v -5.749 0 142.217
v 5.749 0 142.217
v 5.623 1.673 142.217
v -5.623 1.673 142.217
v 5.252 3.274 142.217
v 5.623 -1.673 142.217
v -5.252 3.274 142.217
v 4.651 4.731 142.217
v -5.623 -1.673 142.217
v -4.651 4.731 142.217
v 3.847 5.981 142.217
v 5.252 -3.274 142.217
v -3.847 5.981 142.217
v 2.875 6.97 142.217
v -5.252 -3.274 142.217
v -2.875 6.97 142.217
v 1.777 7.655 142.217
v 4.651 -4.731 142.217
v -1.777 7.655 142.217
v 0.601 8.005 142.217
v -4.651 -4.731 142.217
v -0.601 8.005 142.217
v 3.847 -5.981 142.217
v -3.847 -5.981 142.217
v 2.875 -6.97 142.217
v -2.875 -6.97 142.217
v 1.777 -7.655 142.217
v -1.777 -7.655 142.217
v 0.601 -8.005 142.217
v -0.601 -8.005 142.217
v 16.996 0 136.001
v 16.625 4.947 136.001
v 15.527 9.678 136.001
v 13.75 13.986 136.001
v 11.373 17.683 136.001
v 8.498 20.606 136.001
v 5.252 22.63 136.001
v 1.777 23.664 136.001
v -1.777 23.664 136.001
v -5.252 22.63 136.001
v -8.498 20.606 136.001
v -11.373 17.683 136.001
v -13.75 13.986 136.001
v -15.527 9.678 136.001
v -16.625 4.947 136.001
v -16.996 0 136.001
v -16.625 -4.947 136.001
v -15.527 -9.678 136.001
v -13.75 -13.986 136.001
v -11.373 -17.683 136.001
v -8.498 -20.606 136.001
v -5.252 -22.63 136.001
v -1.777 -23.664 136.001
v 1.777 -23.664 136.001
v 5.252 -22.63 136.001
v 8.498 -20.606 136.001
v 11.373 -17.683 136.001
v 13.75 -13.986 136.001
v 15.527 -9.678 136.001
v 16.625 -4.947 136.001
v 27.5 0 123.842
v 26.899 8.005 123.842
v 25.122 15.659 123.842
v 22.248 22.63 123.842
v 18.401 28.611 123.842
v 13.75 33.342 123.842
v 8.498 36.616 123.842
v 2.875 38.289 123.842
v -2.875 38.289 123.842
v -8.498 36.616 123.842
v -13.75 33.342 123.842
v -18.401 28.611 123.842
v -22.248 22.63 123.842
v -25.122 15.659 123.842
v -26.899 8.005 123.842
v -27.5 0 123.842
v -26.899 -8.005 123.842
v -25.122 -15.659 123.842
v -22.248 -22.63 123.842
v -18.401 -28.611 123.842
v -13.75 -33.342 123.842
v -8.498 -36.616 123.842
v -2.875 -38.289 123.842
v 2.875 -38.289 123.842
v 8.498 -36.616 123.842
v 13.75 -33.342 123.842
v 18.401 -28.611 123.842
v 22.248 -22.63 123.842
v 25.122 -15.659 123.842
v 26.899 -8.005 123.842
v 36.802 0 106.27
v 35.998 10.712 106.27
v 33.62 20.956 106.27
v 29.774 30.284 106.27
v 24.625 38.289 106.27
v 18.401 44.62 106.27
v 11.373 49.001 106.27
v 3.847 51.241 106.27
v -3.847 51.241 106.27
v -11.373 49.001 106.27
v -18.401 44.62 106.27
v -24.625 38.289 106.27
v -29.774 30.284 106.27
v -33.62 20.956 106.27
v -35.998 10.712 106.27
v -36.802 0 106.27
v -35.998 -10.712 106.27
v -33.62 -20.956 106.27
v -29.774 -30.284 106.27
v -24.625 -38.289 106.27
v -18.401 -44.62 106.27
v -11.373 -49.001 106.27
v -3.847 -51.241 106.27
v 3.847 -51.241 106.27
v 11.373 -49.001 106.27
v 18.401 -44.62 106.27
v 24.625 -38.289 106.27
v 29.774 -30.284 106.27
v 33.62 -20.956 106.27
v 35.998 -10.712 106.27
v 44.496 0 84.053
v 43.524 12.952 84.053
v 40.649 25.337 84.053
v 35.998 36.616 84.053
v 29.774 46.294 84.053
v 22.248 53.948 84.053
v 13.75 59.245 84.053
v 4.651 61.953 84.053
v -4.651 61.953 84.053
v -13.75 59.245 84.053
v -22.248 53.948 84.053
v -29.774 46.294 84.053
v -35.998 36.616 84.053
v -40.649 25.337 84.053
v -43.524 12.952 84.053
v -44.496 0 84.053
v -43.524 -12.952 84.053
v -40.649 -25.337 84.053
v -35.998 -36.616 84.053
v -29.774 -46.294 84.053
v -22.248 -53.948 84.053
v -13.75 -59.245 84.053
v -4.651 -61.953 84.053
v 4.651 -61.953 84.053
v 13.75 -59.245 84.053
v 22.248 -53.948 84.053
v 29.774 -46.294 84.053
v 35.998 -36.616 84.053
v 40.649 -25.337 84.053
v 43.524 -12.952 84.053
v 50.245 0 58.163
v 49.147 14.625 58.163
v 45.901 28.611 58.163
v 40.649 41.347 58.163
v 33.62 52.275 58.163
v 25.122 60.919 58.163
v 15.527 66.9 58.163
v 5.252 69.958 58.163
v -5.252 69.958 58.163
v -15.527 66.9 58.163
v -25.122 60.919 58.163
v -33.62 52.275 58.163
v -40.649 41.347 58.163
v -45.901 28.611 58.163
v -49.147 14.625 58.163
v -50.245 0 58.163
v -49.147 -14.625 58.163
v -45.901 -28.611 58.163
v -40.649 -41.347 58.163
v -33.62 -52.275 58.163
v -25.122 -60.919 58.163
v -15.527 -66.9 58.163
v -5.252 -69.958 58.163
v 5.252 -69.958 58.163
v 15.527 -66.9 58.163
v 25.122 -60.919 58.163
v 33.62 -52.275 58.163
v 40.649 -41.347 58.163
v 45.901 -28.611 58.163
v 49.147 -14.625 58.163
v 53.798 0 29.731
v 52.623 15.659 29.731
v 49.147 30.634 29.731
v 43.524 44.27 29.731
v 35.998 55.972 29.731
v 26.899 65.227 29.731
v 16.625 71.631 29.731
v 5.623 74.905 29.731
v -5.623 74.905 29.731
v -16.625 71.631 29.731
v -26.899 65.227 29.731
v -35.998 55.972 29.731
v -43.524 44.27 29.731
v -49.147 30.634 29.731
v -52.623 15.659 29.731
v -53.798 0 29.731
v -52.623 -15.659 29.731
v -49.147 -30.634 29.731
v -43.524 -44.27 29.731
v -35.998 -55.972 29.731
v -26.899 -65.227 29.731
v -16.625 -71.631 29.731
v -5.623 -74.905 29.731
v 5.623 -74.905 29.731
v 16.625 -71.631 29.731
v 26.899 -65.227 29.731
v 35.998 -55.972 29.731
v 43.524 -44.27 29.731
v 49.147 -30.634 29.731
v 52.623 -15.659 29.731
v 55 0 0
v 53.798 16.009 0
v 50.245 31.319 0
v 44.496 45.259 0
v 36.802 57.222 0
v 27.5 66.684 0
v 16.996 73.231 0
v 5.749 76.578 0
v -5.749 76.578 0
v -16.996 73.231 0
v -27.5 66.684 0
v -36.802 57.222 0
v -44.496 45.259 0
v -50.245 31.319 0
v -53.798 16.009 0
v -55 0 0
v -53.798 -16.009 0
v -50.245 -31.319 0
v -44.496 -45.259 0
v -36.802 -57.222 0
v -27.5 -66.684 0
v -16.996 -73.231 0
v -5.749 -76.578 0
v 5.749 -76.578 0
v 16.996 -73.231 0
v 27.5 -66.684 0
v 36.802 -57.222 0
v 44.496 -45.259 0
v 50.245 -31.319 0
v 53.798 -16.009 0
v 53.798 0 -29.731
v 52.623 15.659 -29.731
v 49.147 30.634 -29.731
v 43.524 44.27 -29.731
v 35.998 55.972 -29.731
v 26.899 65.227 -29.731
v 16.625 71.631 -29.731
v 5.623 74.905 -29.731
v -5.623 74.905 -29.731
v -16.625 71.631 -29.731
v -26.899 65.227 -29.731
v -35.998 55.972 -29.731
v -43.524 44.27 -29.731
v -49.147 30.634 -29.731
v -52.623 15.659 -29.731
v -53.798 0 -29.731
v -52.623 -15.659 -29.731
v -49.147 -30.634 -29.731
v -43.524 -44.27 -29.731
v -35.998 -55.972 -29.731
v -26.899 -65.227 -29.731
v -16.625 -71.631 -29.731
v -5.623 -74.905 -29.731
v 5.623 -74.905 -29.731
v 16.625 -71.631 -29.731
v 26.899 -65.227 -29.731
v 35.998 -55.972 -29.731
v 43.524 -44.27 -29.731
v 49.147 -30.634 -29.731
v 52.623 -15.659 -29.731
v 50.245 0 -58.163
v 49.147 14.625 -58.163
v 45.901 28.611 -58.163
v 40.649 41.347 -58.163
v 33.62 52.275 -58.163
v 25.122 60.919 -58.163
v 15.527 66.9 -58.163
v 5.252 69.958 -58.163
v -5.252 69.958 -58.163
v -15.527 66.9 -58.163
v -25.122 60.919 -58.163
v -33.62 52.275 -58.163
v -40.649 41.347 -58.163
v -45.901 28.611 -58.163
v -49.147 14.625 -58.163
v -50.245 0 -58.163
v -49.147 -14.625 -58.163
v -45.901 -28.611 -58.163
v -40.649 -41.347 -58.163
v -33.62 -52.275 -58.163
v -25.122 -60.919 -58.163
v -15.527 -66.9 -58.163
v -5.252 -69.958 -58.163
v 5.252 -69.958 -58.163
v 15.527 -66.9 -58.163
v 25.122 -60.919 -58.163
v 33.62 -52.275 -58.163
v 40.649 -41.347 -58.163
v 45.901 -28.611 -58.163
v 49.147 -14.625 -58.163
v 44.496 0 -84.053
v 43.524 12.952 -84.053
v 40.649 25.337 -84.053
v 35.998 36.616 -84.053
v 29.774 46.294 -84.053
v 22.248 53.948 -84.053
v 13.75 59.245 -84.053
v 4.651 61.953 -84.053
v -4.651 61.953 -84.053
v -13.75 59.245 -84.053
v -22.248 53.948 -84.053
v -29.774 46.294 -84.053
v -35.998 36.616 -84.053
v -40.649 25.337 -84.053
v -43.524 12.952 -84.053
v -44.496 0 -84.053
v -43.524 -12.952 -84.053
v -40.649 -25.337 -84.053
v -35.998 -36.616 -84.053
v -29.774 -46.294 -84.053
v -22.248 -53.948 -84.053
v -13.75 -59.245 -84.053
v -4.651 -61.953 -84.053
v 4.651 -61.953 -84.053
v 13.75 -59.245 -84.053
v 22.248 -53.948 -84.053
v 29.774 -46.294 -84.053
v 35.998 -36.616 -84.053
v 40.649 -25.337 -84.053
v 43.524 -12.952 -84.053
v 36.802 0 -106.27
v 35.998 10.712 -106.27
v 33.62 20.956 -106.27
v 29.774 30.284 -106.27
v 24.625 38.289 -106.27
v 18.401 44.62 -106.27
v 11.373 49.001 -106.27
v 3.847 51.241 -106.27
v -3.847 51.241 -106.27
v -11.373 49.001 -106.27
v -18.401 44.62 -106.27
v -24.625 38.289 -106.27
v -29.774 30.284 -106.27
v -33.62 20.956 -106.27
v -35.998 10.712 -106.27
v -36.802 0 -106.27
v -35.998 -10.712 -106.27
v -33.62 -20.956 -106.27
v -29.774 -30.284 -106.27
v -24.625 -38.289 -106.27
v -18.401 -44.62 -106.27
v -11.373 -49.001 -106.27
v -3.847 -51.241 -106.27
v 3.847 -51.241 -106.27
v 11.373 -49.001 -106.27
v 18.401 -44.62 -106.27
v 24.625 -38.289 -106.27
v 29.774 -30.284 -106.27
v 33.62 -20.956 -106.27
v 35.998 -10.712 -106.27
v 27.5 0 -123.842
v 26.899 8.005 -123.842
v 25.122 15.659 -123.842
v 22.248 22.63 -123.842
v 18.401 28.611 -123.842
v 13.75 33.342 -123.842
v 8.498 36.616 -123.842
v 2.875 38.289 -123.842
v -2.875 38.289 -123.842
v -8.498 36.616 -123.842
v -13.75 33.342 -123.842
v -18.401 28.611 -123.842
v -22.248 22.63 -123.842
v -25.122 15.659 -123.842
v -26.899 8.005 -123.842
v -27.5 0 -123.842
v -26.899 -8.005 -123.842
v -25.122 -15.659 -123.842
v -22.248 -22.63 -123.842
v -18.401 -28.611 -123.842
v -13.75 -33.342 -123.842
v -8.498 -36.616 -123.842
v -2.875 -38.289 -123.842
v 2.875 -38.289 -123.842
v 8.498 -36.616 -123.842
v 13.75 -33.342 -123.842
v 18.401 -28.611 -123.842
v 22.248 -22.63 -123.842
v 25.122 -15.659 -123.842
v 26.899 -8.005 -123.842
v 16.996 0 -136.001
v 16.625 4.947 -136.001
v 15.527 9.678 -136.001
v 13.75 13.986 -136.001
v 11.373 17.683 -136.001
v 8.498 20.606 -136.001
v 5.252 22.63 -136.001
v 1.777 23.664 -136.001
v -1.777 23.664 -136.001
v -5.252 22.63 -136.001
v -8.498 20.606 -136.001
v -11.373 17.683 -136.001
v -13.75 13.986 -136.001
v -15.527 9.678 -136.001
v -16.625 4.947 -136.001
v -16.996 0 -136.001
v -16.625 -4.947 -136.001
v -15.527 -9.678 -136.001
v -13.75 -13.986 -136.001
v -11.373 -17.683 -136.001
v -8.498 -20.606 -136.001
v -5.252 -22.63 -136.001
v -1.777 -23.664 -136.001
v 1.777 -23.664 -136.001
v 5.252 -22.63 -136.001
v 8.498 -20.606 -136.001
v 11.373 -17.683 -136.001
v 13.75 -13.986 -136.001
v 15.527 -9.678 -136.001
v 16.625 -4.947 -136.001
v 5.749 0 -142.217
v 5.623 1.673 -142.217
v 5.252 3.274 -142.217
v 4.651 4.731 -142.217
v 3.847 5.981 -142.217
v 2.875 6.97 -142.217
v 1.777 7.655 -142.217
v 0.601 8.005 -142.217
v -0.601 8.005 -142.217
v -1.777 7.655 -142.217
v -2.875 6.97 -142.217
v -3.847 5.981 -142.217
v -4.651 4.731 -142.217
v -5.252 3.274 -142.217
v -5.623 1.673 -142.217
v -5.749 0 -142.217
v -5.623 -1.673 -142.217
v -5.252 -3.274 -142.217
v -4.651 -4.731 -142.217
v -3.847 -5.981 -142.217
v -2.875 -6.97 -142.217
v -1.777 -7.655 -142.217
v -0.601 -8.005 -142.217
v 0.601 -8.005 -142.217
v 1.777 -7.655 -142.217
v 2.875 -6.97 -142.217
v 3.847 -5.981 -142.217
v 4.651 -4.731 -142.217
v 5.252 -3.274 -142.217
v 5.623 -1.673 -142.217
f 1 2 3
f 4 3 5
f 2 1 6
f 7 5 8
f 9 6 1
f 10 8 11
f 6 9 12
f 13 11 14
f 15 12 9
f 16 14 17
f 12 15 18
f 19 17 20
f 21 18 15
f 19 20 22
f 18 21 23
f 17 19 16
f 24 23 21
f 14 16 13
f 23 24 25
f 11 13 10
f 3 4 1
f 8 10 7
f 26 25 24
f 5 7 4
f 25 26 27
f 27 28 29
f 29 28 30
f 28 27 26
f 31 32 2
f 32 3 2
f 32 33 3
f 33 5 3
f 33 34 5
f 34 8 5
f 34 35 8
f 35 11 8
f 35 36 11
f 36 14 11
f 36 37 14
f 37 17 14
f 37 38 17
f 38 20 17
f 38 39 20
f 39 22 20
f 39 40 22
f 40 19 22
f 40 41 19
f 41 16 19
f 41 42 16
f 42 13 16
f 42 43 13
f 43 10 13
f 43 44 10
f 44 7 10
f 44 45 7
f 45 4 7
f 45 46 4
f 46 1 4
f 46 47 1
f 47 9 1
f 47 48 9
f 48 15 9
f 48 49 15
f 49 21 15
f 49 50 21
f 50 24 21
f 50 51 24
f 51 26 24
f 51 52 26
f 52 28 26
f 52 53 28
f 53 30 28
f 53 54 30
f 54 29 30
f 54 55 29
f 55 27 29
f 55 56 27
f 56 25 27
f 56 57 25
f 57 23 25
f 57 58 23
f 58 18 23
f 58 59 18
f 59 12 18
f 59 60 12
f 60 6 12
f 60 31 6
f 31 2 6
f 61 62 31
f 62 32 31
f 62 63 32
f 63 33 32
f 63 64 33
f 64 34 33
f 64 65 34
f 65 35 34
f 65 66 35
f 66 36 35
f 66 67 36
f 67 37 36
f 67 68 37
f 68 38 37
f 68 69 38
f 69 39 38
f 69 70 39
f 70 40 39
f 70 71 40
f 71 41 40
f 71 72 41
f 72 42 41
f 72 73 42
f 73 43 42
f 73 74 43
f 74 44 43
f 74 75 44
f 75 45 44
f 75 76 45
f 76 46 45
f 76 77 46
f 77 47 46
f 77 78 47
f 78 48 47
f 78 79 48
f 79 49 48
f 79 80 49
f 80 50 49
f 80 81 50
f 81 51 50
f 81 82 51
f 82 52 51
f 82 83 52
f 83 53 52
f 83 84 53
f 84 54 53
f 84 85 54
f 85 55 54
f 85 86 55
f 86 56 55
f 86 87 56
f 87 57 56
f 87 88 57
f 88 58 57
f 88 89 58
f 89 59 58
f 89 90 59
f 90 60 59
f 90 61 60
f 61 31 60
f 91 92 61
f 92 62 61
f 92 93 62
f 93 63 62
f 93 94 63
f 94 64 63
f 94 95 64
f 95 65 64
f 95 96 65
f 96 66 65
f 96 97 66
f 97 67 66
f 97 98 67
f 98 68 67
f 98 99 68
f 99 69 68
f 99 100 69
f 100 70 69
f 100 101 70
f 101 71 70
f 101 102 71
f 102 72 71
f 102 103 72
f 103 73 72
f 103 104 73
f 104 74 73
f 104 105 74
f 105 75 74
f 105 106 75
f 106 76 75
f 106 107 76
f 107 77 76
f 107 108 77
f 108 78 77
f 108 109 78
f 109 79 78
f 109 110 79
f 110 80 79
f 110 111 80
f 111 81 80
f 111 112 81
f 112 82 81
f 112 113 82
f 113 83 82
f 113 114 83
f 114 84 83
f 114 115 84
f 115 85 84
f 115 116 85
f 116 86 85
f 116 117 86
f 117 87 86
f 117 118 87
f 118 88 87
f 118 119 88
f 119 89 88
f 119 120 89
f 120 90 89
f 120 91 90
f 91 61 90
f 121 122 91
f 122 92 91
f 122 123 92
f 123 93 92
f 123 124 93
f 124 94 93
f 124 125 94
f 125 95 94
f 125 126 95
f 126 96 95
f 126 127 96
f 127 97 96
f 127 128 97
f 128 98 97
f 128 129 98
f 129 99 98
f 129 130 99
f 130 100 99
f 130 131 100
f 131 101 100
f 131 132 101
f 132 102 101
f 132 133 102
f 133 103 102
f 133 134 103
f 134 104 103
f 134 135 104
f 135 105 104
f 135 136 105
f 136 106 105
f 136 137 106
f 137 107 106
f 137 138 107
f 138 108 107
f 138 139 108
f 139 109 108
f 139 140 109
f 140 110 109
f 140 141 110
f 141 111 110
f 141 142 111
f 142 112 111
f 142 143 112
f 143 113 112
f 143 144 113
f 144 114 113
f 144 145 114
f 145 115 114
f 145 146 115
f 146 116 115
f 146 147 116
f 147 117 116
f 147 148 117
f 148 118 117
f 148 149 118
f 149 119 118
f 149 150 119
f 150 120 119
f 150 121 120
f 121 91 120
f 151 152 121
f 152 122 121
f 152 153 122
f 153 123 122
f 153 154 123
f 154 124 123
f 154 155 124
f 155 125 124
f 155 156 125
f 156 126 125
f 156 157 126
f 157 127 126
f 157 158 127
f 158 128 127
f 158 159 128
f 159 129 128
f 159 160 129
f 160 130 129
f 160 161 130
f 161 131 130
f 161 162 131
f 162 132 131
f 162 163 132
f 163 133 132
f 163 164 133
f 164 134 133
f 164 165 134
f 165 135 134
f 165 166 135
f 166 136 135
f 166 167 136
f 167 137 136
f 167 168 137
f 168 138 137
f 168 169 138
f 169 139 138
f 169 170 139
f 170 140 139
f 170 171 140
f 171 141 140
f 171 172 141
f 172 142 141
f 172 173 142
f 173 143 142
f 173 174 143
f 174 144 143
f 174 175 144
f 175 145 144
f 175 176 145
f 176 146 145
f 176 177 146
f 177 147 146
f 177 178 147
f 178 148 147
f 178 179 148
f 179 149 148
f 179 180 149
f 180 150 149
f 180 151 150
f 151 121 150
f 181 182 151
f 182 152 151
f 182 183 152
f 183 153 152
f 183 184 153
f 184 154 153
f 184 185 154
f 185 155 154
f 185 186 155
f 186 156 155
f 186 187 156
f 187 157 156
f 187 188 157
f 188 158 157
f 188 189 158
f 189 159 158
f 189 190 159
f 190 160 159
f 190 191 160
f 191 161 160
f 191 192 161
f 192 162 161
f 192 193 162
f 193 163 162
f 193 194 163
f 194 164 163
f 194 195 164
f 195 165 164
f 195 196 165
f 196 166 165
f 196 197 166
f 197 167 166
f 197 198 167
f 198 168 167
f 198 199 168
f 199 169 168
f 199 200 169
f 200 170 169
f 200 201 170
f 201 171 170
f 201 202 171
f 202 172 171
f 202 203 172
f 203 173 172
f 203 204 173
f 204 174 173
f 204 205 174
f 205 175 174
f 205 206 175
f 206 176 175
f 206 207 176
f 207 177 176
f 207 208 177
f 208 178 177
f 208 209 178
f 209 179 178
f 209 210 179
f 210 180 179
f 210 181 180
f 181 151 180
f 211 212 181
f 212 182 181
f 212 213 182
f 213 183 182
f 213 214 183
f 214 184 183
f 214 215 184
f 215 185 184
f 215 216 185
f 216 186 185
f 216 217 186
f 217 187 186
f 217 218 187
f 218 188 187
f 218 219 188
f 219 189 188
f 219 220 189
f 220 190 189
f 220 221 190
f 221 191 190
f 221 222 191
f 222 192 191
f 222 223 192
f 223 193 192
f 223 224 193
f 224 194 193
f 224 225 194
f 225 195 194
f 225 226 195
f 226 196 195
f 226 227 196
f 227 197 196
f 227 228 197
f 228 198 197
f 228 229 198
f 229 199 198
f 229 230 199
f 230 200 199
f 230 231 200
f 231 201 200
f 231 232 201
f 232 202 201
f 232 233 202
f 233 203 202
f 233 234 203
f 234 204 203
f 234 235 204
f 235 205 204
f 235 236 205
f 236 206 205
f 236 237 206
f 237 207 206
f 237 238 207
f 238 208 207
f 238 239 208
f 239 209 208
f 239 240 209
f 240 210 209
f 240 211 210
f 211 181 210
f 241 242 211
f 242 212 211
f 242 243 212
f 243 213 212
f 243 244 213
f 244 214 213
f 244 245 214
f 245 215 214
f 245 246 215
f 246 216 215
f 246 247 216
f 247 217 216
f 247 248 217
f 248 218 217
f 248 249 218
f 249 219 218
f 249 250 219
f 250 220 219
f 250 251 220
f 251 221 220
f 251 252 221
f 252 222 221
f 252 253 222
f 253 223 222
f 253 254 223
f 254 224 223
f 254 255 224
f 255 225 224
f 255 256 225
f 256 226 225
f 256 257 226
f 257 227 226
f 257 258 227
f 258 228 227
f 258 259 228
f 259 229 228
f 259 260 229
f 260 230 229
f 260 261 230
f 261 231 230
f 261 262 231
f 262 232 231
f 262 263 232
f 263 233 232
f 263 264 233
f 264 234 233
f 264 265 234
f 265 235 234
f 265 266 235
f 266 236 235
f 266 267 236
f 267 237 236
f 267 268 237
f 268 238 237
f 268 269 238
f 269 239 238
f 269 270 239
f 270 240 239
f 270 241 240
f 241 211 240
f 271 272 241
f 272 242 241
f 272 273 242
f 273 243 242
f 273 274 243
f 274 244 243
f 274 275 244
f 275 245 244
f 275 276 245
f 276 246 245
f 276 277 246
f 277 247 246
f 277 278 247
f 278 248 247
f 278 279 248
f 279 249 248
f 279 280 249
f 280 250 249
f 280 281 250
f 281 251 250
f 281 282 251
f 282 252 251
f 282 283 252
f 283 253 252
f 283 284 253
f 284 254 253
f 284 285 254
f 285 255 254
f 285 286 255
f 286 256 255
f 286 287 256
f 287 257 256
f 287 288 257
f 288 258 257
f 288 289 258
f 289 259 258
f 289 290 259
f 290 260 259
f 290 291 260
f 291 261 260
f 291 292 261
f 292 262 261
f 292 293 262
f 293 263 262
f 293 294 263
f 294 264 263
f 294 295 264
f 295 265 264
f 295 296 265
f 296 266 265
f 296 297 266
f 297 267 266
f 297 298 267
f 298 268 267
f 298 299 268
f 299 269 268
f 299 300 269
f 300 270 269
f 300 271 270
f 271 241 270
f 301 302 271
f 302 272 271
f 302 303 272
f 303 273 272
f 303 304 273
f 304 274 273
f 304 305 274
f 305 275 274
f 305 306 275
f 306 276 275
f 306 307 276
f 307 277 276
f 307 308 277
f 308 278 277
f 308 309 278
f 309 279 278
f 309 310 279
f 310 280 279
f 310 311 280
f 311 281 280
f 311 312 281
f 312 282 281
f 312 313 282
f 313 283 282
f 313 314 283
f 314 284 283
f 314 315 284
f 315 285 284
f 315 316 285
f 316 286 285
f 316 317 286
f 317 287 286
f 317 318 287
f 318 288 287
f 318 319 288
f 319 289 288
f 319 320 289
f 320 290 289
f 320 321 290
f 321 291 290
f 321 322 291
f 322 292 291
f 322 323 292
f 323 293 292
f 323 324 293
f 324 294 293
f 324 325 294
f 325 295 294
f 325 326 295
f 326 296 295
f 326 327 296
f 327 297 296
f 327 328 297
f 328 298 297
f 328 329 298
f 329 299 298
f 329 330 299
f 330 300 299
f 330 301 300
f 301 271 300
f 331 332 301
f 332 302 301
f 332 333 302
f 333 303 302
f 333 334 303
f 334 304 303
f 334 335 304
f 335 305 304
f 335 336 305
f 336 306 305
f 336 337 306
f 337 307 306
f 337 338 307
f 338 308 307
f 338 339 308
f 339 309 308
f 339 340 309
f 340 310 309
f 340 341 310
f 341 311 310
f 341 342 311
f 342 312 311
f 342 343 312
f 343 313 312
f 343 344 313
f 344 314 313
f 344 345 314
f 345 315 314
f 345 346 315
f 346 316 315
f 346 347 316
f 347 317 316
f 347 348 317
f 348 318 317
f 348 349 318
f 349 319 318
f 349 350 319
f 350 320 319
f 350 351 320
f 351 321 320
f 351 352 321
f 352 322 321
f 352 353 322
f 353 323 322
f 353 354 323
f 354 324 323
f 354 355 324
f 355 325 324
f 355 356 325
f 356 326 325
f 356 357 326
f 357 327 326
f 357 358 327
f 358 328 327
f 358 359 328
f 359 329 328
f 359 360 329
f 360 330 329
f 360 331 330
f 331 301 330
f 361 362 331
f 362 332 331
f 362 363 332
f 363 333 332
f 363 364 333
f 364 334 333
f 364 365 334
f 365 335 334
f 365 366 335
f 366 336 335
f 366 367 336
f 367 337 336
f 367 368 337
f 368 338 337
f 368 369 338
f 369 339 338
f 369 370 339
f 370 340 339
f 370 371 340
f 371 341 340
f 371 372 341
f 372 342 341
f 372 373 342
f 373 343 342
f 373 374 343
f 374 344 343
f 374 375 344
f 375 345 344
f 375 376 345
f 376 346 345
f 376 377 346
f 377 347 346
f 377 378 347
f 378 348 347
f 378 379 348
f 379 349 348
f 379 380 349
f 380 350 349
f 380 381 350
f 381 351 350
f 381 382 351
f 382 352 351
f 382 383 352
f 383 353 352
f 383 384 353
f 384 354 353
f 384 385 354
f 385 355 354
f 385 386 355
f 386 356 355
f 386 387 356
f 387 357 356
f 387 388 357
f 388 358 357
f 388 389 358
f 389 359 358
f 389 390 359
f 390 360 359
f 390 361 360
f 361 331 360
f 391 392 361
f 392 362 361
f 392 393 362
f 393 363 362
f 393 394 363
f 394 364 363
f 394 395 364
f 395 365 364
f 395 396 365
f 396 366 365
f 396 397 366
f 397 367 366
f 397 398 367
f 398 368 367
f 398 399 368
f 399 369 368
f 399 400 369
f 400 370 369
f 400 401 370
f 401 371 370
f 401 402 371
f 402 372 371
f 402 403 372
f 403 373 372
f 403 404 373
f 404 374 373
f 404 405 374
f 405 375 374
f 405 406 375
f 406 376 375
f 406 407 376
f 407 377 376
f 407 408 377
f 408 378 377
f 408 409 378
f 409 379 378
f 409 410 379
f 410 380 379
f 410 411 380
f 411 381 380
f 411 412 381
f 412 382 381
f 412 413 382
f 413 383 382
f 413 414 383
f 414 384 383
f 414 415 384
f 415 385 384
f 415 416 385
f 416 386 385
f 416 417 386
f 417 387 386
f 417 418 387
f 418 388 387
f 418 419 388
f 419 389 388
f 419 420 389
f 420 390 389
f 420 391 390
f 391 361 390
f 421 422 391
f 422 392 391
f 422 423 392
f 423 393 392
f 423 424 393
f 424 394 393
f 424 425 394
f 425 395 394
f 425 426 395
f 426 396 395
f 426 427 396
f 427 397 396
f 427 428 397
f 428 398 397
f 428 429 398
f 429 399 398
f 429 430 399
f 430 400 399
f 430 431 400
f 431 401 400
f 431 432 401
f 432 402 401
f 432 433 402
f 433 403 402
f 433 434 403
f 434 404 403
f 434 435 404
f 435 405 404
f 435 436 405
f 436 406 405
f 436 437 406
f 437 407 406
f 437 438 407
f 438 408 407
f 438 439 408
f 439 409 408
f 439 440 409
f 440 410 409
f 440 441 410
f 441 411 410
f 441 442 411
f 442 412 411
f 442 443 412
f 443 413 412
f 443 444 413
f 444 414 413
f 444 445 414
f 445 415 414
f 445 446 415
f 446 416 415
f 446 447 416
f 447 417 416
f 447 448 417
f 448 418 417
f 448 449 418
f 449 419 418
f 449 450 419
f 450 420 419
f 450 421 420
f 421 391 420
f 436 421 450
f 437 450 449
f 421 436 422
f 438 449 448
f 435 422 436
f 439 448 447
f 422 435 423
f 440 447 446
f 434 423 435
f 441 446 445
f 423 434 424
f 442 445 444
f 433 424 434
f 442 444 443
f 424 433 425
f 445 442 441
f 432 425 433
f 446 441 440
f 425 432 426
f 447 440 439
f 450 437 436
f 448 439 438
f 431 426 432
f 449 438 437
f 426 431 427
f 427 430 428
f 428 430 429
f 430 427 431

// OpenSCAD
// Generated by SolidPython 1.0.1 on 2020-07-29 00:46:46


scale(v = [5, 7, 13]) {
	sphere(r = 11);
}
/***********************************************
*********      SolidPython code:      **********
************************************************
 
# import packages: SolidPython
from solid import *
from solid.utils import *
from itertools import chain, combinations, permutations


class Resize:

    def __init__(self, scad_file):
        self.scad_file = scad_file
        #self.scad_file = import_scad(scad_file)
        # cone/cylinder param:
        self.r1 = 0
        self.r2 = 0
        self.h = 0
        # rectangular prism param:
        self.w = 0
        self.l = 0
        # ellipse param:
        self.r = 0

    # import OpenScad code (file name corresponds to shape)


    # classify shape + parameters
    def assign(self, param1, param2, param3):
        if self.scad_file == 'cone.scad':
            self.r1 = param1
            self.r2 = param2
            self.h = param3
        elif self.scad_file == 'cylinder.scad':
            self.r1 = param1
            self.r2 = param2
            self.h = param3
        elif self.scad_file == 'rectangularPrism.scad':
            self.h = param1
            self.l = param2
            self.w = param3
        else:
            self.r = param1
            self.h = param2

    # resize parameters
    def iterate(self):
        x = range(3, 20, 2)
        i = 1
        if self.scad_file == 'cone.scad':
            tempList = list(permutations(x, 2))
            for temp in tempList:
                param1 = temp[0]
                param2 = temp[1]
                filepath = 'produced_scad_files/' + 'cone' + str(param1) + '_' + str(param2) + '_' + '.scad'
                scad_render_to_file(cylinder(h=param1, r1=param2, r2=0), filepath)

        elif self.scad_file == 'cylinder.scad':
            tempList = list(permutations(x, 3))
            for temp in tempList:
                param1 = temp[0]
                param2 = temp[1]
                filepath = 'produced_scad_files/' + 'cylinder' + str(param1) + '_' + str(param2) + '_' + '.scad'
                scad_render_to_file(cylinder(h=param1, r1=param2, r2=param2), filepath)

        elif self.scad_file == 'rectangularPrism.scad':
            tempList = list(permutations(x, 3))
            for temp in tempList:
                param1 = temp[0]
                param2 = temp[1]
                param3 = temp[2]
                filepath = 'produced_scad_files/' + 'rectangularPrism' + str(param1) + '_' + str(param2) + '_' + str(
                    param3) + '.scad'
                scad_render_to_file(cube(size=(param1, param2, param3)), filepath)

        elif self.scad_file == 'ellipse.scad':
            tempList = list(permutations(x, 4))
            for temp in tempList:
                param1 = temp[0]
                param2 = temp[1]
                param3 = temp[2]
                param4 = temp[3]
                filepath = 'produced_scad_files/' + 'ellipse' + str(param1) + '_' + str(param2) + '_' + str(param3) + '_' + str(param4) + '.scad'
                scad_render_to_file(scale([param1, param2, param3])(sphere(r=param4)), filepath)

    def render_to_scadfile(self):
        scad_render_to_file(scad, 'example.scad') 
 
************************************************/
